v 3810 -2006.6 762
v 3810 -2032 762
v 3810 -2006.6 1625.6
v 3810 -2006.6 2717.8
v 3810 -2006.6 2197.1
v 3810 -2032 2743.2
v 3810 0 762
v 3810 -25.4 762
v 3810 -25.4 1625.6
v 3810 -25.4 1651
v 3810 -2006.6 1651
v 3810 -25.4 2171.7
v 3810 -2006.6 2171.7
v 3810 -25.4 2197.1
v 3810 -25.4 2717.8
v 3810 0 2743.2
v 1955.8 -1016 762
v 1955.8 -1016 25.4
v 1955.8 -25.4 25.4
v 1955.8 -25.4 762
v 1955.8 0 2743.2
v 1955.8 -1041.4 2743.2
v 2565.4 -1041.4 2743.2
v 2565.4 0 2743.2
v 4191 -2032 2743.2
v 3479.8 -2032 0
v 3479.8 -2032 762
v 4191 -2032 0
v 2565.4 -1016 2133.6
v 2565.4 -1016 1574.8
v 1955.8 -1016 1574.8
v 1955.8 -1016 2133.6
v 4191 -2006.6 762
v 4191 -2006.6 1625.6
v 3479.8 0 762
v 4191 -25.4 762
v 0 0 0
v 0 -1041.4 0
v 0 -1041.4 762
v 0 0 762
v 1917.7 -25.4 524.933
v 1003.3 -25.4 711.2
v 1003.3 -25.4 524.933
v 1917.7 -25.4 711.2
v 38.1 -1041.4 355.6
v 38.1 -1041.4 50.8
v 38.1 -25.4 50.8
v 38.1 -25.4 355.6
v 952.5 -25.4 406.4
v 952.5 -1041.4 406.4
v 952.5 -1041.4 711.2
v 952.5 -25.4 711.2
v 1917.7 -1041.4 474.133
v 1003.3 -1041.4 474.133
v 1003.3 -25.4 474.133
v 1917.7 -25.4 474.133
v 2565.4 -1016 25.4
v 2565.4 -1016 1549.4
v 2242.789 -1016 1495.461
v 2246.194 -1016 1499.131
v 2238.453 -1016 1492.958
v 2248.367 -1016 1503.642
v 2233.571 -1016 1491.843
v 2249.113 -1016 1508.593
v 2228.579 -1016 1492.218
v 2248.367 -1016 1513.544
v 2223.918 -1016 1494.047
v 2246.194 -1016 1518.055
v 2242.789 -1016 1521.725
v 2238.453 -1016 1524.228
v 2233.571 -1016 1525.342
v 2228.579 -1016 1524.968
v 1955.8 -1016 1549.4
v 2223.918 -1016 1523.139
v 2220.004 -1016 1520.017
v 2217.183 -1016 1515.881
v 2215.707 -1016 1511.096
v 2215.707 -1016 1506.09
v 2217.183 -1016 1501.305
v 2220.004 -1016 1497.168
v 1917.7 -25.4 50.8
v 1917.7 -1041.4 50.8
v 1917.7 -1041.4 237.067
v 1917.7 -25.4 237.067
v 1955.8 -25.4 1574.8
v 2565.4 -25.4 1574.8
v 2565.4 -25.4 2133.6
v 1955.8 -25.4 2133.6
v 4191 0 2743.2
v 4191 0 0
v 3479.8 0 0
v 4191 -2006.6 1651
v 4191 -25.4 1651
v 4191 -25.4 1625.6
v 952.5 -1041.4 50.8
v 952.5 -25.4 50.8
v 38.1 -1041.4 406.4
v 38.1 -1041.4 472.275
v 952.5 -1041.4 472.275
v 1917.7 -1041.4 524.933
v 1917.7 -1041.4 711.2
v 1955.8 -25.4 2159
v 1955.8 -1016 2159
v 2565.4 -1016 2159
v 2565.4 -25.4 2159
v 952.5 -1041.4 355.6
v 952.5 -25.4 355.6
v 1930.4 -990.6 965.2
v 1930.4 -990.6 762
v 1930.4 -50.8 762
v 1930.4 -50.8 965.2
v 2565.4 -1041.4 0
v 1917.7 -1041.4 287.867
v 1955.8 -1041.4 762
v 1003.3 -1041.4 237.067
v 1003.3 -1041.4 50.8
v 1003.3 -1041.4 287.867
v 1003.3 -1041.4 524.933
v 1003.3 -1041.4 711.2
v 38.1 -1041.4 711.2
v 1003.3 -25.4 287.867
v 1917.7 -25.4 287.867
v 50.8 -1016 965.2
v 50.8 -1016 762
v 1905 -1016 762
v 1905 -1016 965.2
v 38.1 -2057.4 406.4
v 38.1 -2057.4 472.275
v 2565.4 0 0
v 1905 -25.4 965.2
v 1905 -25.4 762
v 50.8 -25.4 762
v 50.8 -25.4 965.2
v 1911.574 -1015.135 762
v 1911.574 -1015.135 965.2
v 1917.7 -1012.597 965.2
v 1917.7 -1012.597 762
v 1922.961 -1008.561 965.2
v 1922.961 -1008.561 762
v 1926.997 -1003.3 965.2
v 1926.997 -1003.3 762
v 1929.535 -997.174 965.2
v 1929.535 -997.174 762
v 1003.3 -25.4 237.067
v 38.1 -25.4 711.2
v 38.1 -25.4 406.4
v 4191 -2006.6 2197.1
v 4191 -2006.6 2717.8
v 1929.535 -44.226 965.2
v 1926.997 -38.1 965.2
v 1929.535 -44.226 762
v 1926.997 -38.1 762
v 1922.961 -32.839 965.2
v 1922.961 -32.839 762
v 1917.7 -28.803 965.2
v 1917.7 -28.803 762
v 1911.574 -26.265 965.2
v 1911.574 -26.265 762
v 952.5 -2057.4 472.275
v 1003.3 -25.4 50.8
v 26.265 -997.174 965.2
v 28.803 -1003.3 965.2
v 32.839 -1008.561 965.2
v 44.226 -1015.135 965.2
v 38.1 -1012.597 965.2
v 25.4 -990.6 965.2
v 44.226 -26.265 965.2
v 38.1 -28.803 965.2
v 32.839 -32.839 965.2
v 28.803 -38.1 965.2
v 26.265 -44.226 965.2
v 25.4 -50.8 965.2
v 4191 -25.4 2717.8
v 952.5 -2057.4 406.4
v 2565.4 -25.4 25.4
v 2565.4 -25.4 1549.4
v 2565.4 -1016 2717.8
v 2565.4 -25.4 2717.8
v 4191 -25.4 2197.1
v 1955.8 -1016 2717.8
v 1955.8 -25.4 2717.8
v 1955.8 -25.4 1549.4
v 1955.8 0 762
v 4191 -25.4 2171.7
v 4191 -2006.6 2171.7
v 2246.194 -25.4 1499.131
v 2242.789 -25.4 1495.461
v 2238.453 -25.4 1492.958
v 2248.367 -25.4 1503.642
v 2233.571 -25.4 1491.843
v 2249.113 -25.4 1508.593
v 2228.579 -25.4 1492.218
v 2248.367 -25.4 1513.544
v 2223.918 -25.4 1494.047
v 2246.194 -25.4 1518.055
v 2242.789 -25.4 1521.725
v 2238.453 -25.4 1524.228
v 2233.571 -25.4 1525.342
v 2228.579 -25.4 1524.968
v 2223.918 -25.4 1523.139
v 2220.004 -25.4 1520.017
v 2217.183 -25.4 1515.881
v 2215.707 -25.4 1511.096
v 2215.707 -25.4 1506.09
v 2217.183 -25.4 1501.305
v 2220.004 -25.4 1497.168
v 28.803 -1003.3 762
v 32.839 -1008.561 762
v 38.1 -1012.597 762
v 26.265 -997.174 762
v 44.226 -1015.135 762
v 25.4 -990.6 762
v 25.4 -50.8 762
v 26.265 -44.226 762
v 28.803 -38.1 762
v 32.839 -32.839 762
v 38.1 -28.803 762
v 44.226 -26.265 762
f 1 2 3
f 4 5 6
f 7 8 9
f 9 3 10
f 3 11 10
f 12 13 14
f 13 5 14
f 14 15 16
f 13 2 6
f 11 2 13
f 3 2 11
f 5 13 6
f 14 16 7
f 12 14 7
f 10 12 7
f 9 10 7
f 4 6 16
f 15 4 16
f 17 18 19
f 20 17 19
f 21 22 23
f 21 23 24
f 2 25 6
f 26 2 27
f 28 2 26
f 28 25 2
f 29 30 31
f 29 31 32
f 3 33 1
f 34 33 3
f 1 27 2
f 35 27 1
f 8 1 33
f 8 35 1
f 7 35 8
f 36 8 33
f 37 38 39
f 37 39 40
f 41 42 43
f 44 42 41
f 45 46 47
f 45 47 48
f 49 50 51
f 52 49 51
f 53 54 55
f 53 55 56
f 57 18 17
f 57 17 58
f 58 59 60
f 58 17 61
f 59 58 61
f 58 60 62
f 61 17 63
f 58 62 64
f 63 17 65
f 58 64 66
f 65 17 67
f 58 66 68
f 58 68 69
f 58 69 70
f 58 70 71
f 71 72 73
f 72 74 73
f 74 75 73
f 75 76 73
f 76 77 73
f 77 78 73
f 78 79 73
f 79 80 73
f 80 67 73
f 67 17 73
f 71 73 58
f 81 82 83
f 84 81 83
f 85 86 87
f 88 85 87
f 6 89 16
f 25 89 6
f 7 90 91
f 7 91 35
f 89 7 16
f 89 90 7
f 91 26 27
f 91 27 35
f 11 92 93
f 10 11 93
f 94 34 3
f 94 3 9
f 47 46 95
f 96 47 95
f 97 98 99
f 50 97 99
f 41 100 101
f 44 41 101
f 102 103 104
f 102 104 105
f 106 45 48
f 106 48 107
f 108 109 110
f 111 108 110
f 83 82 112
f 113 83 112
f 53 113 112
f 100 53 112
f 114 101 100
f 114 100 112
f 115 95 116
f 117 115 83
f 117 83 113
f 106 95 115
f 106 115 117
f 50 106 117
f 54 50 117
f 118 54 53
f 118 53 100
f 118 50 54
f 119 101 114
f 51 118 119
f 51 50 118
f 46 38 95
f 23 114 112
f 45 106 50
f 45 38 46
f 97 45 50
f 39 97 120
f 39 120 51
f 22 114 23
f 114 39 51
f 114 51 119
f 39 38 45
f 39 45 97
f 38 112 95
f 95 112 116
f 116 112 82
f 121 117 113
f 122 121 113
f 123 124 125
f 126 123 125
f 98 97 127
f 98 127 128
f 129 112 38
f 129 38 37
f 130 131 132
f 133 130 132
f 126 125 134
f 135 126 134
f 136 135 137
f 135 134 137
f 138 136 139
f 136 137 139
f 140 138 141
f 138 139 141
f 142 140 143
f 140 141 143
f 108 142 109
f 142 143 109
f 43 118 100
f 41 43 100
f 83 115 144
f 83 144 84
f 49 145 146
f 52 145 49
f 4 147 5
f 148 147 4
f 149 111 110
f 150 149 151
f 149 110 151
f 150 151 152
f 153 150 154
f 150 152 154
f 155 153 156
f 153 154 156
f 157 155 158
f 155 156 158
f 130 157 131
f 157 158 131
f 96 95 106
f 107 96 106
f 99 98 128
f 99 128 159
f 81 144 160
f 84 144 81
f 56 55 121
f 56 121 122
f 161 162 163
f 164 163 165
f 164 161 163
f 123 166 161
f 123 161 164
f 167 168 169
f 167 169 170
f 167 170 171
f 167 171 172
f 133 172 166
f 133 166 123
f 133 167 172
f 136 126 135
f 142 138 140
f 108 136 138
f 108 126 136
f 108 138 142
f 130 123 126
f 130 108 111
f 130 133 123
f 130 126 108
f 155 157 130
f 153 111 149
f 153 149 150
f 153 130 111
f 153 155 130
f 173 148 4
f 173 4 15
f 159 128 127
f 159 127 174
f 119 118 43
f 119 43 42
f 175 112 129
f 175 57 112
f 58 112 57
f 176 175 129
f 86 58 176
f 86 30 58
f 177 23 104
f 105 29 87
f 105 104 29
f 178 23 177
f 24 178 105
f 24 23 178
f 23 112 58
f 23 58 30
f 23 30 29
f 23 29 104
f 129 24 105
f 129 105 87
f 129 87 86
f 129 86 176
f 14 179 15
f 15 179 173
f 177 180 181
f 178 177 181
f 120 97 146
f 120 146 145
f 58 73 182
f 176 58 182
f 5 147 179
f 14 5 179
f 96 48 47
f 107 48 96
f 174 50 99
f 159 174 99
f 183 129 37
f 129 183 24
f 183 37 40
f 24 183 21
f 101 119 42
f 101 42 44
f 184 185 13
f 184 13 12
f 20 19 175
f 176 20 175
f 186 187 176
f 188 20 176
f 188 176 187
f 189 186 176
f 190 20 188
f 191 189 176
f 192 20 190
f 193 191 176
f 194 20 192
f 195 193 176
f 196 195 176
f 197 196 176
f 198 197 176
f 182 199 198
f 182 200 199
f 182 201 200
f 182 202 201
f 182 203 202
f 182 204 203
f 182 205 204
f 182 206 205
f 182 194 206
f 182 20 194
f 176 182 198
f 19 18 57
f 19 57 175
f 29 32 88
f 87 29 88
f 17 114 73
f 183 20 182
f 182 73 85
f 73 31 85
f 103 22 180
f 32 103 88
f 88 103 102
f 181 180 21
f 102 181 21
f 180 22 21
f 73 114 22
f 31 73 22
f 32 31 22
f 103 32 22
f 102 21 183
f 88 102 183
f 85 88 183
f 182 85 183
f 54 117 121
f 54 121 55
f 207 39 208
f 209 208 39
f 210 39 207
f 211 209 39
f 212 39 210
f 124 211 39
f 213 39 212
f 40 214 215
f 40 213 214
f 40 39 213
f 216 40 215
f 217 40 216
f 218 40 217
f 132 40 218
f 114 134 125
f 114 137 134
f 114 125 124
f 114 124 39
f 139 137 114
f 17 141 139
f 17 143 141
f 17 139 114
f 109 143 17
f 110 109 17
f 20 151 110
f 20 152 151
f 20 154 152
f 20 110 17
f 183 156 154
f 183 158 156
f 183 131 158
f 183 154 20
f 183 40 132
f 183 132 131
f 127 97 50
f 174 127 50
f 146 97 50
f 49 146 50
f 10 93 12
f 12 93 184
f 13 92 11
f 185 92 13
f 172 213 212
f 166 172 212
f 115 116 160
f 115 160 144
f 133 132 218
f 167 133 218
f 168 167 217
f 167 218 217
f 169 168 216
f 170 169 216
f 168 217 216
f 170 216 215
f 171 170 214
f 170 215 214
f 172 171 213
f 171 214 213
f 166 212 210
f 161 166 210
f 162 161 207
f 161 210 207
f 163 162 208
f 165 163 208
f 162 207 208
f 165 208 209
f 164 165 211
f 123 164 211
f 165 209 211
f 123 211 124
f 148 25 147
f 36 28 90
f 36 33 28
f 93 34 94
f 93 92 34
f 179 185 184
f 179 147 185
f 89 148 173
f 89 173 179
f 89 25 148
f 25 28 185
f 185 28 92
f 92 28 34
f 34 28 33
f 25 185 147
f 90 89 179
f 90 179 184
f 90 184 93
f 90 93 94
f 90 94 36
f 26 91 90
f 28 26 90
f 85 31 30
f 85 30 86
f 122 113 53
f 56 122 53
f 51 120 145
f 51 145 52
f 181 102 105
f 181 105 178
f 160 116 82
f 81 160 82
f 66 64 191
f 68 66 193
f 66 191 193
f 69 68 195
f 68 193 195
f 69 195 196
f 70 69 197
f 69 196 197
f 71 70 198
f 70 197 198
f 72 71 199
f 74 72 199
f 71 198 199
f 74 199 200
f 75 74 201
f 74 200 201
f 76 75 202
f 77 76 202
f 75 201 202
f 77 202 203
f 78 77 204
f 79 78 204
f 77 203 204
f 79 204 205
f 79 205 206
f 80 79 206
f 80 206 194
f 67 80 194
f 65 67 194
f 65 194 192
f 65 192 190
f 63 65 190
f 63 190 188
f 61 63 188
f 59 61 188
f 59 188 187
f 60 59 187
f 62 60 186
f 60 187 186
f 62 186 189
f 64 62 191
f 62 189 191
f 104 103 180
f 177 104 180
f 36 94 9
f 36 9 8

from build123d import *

# Parameters (mm, degrees)
F0_W      = 1955.8
F0_H      = 1041.4
F1_DEPTH  = 762
F3_DEPTH  = 203.2
F4_W      = 914.4
F4_H      = 304.8
F4_H_2    = 186.266667
F4_H_3    = 186.266666
F5_DEPTH  = 1016
F6_W      = 914.4
F6_H      = 65.874542
F7_DEPTH  = 1016
F8_W      = 1041.4
F8_H      = 2743.2
F8_W_2    = 990.6
F8_H_2    = 1524
F8_H_3    = 558.8
F9_DEPTH  = 609.6
F10_R     = 16.796482
F11_DEPTH = 990.6
F12_W     = 711.2
F12_H     = 2032
F13_DEPTH = 762
F14_W     = 1981.2
F14_H     = 520.7
F15_DEPTH = 381


with BuildPart() as f1:
    # F0 (on Top) → F1 (new body)
    with BuildSketch(Plane.XY):
        with Locations((977.9, -520.7)):
            Rectangle(F0_W, F0_H)
    extrude(amount=F1_DEPTH)

    # F2 (on face) → F3 (join)
    with BuildSketch(Plane.XY.offset(762)):
        with BuildLine():
            Line((1905, -25.4), (50.8, -25.4))
            ThreePointArc((50.8, -25.4), (32.839488, -32.839488), (25.4, -50.8))
            Line((25.4, -50.8), (25.4, -990.6))
            ThreePointArc((25.4, -990.6), (32.839488, -1008.560512), (50.8, -1016))
            Line((50.8, -1016), (1905, -1016))
            ThreePointArc((1905, -1016), (1922.960512, -1008.560512), (1930.4, -990.6))
            Line((1930.4, -990.6), (1930.4, -50.8))
            ThreePointArc((1930.4, -50.8), (1922.960512, -32.839488), (1905, -25.4))
        make_face()
    extrude(amount=F3_DEPTH)

    # F4 (on face) → F5 (cut)
    with BuildSketch(Plane.XZ.offset(1041.4)):
        with Locations((495.3, 558.8)):
            Rectangle(F4_W, F4_H)
        with Locations((495.3, 203.2)):
            Rectangle(F4_W, F4_H)
        with Locations((1460.5, 618.066666)):
            Rectangle(F4_W, F4_H_2)
        with Locations((1460.5, 381)):
            Rectangle(F4_W, F4_H_3)
        with Locations((1460.5, 143.933334)):
            Rectangle(F4_W, F4_H_2)
    extrude(amount=-F5_DEPTH, mode=Mode.SUBTRACT)

    # F8 (on face) → F9 (join)
    with BuildSketch(Plane.YZ.offset(1955.8)):
        with Locations((-520.7, 1371.6)):
            Rectangle(F8_W, F8_H)
        with Locations((-520.7, 787.4)):
            Rectangle(F8_W_2, F8_H_2, mode=Mode.SUBTRACT)
        with Locations((-520.7, 1854.2)):
            Rectangle(F8_W_2, F8_H_3, mode=Mode.SUBTRACT)
        with Locations((-520.7, 2438.4)):
            Rectangle(F8_W_2, F8_H_3, mode=Mode.SUBTRACT)
    extrude(amount=F9_DEPTH)

    # F10 (on face) → F11 (join, through all)
    with BuildSketch(Plane.XZ.offset(25.4)):
        with Locations((2232.316256, 1508.592963)):
            Circle(F10_R)
    extrude(amount=F11_DEPTH)


with BuildPart() as f7:
    # F6 (on face) → F7 (new body)
    with BuildSketch(Plane.XZ.offset(1041.4)):
        with Locations((495.3, 439.337271)):
            Rectangle(F6_W, F6_H)
    extrude(amount=F7_DEPTH)


with BuildPart() as f13:
    # F12 (on Top) → F13 (new body)
    with BuildSketch(Plane.XY):
        with Locations((3835.4, -1016)):
            Rectangle(F12_W, F12_H)
    extrude(amount=F13_DEPTH)

    # F14 (on face) → F15 (join)
    with BuildSketch(Plane.YZ.offset(4191)):
        Polygon((-2032, 2743.2), (-2032, 762), (-2006.6, 762), (-2006.6, 1625.6), (-25.4, 1625.6), (-25.4, 762), (0, 762), (0, 2743.2), align=None)
        with Locations((-1016, 1911.35)):
            Rectangle(F14_W, F14_H, mode=Mode.SUBTRACT)
        with Locations((-1016, 2457.45)):
            Rectangle(F14_W, F14_H, mode=Mode.SUBTRACT)
    extrude(amount=-F15_DEPTH)


solid = Compound([f1.part, f7.part, f13.part])
